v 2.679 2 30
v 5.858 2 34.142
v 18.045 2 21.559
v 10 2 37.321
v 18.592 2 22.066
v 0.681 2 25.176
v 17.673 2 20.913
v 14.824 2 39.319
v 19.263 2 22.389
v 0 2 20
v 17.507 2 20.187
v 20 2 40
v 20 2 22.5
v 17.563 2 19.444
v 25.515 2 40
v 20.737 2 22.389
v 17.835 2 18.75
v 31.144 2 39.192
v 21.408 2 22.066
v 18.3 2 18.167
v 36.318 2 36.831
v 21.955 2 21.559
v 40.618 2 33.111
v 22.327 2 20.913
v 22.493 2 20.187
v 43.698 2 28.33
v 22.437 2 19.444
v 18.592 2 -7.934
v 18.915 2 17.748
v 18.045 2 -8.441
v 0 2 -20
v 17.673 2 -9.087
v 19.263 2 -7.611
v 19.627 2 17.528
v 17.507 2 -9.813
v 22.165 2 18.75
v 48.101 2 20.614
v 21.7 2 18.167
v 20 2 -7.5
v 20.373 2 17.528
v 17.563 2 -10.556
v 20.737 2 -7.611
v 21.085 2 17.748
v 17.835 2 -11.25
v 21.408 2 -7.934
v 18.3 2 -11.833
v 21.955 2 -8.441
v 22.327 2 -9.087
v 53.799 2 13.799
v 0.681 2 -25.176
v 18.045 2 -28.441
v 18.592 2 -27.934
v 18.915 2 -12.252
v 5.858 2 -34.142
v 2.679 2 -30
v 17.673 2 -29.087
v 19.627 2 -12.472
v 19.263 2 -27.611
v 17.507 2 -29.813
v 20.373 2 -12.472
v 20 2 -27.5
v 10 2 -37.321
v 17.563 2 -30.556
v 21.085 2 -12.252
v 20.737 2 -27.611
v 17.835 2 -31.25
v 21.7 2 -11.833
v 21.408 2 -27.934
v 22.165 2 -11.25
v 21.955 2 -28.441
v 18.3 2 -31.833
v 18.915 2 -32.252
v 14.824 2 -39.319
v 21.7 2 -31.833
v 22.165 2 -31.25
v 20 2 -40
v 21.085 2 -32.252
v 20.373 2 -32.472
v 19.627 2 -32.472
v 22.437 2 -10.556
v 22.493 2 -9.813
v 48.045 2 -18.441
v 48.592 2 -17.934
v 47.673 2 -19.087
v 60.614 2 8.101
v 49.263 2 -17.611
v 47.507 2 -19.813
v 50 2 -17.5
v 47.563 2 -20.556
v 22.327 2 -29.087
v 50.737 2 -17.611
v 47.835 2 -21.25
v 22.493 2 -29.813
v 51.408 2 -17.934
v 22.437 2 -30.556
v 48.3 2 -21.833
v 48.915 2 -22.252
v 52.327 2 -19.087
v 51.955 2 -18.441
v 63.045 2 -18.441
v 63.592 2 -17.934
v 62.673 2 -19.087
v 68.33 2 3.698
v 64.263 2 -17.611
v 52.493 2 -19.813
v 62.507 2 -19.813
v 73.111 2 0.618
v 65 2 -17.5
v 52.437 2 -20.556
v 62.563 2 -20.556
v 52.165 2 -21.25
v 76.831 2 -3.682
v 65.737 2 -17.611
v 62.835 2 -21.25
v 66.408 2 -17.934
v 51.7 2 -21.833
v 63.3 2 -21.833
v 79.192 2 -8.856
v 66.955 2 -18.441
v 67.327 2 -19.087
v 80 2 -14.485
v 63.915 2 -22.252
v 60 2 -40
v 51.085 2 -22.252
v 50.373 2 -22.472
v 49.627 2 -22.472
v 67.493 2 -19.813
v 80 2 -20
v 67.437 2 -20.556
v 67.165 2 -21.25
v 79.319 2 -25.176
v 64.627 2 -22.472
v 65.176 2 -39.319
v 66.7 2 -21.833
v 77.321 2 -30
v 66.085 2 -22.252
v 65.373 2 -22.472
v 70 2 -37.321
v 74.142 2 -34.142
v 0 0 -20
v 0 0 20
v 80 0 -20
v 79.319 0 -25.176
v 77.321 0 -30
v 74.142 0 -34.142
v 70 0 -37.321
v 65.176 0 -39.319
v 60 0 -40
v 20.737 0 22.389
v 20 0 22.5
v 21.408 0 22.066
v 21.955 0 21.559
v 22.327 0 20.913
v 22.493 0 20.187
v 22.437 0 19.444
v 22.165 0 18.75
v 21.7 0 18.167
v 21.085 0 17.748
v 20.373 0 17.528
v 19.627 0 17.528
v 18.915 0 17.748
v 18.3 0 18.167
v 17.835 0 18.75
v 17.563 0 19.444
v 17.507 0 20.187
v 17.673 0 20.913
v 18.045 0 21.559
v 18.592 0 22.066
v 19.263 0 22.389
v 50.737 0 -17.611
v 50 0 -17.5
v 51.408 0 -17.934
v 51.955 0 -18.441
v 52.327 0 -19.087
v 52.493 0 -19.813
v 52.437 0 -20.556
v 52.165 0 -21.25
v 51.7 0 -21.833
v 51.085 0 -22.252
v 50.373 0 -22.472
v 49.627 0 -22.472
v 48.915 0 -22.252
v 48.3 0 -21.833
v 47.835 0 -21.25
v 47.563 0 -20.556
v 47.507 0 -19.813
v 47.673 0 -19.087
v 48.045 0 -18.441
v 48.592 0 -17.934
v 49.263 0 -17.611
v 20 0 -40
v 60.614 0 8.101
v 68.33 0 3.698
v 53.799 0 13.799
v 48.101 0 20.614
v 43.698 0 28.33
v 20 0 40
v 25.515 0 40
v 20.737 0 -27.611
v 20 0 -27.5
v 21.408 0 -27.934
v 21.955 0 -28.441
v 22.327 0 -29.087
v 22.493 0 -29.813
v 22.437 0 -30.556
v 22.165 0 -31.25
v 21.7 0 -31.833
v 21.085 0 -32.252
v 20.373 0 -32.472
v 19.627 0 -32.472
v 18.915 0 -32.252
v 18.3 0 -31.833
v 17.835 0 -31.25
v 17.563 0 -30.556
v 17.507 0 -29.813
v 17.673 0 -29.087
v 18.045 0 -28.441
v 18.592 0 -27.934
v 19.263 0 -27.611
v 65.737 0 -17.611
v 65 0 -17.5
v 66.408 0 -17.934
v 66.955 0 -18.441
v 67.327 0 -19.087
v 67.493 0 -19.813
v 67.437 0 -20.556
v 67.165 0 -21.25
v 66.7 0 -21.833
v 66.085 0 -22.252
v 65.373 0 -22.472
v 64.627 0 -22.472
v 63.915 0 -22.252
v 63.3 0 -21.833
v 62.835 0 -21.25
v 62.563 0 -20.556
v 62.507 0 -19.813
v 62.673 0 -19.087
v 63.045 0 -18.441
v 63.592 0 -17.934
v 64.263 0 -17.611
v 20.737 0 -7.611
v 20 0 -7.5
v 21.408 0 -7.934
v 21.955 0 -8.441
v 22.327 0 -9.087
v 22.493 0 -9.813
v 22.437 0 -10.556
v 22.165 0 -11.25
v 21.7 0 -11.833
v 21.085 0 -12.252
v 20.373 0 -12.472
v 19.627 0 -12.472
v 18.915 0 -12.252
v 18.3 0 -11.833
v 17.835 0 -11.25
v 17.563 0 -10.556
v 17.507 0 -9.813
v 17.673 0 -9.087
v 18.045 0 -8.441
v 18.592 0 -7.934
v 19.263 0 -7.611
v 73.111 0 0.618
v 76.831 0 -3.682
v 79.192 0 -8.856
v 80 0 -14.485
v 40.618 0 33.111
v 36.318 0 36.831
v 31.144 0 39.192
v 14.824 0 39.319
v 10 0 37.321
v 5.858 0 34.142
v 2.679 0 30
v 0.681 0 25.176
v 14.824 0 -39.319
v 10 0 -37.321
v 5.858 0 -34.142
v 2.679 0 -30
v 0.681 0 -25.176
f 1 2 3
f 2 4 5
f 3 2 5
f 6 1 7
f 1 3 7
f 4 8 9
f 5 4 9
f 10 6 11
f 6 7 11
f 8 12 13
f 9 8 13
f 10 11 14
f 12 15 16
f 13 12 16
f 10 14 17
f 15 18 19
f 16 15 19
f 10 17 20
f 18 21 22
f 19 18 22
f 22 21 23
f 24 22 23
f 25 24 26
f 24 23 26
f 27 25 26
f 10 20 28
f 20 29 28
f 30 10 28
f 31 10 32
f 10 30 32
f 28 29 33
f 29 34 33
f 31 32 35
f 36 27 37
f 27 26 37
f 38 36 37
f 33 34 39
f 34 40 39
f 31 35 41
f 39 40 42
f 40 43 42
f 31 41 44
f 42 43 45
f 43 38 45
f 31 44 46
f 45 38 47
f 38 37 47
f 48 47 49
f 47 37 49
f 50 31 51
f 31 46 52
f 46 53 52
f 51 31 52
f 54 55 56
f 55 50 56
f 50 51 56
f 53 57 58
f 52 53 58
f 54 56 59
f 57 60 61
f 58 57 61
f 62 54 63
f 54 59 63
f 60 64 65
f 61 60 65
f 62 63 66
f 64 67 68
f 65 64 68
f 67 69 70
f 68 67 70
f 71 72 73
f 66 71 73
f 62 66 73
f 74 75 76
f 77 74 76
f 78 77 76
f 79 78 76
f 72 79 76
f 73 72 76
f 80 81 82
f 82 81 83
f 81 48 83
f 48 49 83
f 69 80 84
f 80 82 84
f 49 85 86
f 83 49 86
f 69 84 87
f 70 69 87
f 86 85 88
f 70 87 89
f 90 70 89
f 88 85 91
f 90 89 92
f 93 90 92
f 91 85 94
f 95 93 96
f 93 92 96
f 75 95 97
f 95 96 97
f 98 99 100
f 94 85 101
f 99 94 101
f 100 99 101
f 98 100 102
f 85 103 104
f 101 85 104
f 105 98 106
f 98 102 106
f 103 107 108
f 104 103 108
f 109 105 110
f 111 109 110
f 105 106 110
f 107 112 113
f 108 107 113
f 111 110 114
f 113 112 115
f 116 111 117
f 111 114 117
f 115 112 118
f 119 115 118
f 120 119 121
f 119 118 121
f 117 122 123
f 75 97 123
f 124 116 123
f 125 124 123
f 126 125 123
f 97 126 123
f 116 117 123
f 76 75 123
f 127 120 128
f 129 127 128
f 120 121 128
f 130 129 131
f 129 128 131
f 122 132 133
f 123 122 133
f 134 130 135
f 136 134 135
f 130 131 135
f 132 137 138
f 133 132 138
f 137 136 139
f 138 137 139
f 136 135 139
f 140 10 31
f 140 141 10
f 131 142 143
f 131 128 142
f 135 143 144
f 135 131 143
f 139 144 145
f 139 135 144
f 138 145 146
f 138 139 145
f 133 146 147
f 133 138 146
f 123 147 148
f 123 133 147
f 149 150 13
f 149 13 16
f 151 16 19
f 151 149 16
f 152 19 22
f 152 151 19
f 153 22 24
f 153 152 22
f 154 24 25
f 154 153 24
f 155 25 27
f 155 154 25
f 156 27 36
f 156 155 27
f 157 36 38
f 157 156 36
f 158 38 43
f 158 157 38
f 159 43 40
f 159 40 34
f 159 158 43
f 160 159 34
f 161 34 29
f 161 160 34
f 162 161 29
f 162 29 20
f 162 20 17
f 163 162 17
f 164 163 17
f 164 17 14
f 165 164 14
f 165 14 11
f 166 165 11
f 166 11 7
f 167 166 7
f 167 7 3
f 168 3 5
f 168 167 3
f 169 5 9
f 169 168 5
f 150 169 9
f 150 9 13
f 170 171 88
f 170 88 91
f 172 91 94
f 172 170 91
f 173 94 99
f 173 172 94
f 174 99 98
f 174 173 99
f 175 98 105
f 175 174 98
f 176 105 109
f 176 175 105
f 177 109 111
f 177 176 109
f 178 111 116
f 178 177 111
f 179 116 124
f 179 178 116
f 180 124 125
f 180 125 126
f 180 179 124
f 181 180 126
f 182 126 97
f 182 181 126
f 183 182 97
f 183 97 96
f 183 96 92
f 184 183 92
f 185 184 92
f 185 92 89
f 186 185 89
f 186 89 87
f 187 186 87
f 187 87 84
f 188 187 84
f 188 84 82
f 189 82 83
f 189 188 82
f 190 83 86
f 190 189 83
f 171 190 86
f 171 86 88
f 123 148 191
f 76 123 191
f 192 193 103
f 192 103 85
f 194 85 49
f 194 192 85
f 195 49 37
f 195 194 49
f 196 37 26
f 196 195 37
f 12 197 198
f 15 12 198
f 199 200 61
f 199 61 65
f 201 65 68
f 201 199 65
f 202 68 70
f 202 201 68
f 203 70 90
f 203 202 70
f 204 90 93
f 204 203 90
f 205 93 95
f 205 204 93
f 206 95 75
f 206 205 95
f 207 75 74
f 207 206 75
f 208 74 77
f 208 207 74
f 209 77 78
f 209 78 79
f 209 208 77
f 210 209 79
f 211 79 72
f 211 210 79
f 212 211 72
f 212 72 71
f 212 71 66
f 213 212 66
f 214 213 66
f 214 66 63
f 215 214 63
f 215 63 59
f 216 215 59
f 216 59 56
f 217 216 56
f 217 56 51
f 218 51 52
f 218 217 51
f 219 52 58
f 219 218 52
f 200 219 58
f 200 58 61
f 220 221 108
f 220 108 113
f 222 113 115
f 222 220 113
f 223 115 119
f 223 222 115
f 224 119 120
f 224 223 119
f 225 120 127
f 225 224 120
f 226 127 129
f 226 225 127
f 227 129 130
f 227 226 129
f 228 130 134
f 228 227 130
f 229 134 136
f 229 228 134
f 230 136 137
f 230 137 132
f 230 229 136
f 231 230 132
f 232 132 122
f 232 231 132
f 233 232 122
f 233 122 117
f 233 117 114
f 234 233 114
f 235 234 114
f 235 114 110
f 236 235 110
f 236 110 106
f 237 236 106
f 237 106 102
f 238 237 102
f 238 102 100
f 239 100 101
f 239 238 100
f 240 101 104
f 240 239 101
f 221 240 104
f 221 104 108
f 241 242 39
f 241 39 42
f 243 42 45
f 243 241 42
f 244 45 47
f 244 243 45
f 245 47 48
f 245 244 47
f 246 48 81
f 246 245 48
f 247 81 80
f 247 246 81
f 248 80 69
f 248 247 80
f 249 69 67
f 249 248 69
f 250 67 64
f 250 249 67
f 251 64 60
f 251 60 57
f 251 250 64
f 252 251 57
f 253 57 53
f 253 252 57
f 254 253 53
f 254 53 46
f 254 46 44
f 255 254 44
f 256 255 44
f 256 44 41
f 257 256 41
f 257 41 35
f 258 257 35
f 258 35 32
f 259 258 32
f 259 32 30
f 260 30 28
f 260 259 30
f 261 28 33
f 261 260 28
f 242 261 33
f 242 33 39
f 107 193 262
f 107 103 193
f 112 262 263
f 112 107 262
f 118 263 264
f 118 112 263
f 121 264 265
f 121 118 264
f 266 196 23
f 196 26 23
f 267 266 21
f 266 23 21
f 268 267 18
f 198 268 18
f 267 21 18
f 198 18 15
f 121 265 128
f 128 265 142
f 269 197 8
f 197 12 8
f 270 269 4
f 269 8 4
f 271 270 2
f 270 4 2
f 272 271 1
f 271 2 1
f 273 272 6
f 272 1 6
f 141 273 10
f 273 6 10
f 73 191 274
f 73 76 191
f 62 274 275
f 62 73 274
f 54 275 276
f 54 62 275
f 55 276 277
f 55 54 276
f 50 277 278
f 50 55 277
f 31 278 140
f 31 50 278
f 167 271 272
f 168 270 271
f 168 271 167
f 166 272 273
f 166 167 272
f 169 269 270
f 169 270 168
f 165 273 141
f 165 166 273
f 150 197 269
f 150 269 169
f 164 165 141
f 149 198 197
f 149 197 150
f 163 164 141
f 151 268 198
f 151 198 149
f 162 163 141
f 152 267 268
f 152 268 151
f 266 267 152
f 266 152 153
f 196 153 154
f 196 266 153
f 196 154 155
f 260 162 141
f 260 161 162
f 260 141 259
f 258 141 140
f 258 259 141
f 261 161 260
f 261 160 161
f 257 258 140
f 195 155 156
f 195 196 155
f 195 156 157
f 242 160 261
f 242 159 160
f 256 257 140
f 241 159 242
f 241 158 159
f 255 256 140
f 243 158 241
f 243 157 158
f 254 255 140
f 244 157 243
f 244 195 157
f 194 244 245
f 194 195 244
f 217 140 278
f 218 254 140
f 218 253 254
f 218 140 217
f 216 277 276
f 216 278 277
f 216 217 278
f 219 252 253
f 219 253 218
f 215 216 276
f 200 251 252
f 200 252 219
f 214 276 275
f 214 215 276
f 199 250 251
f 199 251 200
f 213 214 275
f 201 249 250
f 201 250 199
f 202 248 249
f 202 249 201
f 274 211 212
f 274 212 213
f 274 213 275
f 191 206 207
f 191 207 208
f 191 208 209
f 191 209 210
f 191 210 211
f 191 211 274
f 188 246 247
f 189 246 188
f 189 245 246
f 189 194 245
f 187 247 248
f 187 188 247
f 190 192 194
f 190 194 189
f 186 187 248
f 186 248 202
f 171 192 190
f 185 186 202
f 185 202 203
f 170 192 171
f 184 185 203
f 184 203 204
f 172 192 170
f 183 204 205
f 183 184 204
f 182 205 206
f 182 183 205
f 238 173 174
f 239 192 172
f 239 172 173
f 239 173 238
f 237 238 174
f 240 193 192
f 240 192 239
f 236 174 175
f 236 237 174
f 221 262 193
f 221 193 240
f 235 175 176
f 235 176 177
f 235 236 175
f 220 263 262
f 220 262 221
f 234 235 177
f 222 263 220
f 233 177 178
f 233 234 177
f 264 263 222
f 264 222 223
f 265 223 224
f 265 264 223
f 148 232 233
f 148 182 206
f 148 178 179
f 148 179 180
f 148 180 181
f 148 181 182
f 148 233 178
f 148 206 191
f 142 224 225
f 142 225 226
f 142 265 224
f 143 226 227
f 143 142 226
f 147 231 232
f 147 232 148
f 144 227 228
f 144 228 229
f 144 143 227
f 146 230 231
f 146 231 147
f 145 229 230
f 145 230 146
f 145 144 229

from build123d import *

# Parameters (mm, degrees)
SKETCH1_R           = 2.5
SKETCH1_W           = 40
SKETCH1_H           = 40
BOSS_EXTRUDE1_DEPTH = 2
FILLET1_R           = 50
FILLET2_R           = 20


with BuildPart() as part:
    # Sketch1 → Boss-Extrude1 (new body)
    # profile 1 of 2: a face of its own
    with BuildSketch(Plane(origin=(0, 0, 0), x_dir=(1, 0, 0), z_dir=(0, 1, 0))):
        Polygon((80, 0), (80, 40), (0, 40), (0, 0), (40, 0), align=None)
        with Locations(Location((20, 10, 0), (0, 0, 270))):
            Circle(SKETCH1_R, mode=Mode.SUBTRACT)
        with Locations(Location((20, 30, 0), (0, 0, 270))):
            Circle(SKETCH1_R, mode=Mode.SUBTRACT)
        with Locations(Location((50, 20, 0), (0, 0, 270))):
            Circle(SKETCH1_R, mode=Mode.SUBTRACT)
        with Locations(Location((65, 20, 0), (0, 0, 270))):
            Circle(SKETCH1_R, mode=Mode.SUBTRACT)
    # profile 2 of 2: a face of its own
    with BuildSketch(Plane(origin=(0, 0, 0), x_dir=(1, 0, 0), z_dir=(0, 1, 0))):
        with Locations((20, -20)):
            Rectangle(SKETCH1_W, SKETCH1_H)
        with Locations(Location((20, -20, 0), (0, 0, 270))):
            Circle(SKETCH1_R, mode=Mode.SUBTRACT)
    extrude(amount=BOSS_EXTRUDE1_DEPTH)

    # Fillet1
    # the kernel refuses this fillet: 50 mm, written as the material it adds along each edge
    with BuildSketch(Plane(origin=(40, 0, 0), x_dir=(0, 0, 1), z_dir=(0, 1, 0))) as fillet1_piece_1:
        with BuildLine():
            CenterArc((49.154759474, 49.154759474), FILLET1_R, 190.550098012, 68.899803976)
            Line((0, 40), (0, 0))
            Line((0, 0), (40, 0))
        make_face()
    extrude(amount=2)

    # Fillet2
    fillet2_edges = [part.edges().sort_by_distance(p)[0] for p in [
        (80, 1, -40),
        (80, 1, 0),
        (40, 1, 40),
        (0, 1, 40),
        (0, 1, -40),
    ]]
    fillet(fillet2_edges, radius=FILLET2_R)


solid = part.part
